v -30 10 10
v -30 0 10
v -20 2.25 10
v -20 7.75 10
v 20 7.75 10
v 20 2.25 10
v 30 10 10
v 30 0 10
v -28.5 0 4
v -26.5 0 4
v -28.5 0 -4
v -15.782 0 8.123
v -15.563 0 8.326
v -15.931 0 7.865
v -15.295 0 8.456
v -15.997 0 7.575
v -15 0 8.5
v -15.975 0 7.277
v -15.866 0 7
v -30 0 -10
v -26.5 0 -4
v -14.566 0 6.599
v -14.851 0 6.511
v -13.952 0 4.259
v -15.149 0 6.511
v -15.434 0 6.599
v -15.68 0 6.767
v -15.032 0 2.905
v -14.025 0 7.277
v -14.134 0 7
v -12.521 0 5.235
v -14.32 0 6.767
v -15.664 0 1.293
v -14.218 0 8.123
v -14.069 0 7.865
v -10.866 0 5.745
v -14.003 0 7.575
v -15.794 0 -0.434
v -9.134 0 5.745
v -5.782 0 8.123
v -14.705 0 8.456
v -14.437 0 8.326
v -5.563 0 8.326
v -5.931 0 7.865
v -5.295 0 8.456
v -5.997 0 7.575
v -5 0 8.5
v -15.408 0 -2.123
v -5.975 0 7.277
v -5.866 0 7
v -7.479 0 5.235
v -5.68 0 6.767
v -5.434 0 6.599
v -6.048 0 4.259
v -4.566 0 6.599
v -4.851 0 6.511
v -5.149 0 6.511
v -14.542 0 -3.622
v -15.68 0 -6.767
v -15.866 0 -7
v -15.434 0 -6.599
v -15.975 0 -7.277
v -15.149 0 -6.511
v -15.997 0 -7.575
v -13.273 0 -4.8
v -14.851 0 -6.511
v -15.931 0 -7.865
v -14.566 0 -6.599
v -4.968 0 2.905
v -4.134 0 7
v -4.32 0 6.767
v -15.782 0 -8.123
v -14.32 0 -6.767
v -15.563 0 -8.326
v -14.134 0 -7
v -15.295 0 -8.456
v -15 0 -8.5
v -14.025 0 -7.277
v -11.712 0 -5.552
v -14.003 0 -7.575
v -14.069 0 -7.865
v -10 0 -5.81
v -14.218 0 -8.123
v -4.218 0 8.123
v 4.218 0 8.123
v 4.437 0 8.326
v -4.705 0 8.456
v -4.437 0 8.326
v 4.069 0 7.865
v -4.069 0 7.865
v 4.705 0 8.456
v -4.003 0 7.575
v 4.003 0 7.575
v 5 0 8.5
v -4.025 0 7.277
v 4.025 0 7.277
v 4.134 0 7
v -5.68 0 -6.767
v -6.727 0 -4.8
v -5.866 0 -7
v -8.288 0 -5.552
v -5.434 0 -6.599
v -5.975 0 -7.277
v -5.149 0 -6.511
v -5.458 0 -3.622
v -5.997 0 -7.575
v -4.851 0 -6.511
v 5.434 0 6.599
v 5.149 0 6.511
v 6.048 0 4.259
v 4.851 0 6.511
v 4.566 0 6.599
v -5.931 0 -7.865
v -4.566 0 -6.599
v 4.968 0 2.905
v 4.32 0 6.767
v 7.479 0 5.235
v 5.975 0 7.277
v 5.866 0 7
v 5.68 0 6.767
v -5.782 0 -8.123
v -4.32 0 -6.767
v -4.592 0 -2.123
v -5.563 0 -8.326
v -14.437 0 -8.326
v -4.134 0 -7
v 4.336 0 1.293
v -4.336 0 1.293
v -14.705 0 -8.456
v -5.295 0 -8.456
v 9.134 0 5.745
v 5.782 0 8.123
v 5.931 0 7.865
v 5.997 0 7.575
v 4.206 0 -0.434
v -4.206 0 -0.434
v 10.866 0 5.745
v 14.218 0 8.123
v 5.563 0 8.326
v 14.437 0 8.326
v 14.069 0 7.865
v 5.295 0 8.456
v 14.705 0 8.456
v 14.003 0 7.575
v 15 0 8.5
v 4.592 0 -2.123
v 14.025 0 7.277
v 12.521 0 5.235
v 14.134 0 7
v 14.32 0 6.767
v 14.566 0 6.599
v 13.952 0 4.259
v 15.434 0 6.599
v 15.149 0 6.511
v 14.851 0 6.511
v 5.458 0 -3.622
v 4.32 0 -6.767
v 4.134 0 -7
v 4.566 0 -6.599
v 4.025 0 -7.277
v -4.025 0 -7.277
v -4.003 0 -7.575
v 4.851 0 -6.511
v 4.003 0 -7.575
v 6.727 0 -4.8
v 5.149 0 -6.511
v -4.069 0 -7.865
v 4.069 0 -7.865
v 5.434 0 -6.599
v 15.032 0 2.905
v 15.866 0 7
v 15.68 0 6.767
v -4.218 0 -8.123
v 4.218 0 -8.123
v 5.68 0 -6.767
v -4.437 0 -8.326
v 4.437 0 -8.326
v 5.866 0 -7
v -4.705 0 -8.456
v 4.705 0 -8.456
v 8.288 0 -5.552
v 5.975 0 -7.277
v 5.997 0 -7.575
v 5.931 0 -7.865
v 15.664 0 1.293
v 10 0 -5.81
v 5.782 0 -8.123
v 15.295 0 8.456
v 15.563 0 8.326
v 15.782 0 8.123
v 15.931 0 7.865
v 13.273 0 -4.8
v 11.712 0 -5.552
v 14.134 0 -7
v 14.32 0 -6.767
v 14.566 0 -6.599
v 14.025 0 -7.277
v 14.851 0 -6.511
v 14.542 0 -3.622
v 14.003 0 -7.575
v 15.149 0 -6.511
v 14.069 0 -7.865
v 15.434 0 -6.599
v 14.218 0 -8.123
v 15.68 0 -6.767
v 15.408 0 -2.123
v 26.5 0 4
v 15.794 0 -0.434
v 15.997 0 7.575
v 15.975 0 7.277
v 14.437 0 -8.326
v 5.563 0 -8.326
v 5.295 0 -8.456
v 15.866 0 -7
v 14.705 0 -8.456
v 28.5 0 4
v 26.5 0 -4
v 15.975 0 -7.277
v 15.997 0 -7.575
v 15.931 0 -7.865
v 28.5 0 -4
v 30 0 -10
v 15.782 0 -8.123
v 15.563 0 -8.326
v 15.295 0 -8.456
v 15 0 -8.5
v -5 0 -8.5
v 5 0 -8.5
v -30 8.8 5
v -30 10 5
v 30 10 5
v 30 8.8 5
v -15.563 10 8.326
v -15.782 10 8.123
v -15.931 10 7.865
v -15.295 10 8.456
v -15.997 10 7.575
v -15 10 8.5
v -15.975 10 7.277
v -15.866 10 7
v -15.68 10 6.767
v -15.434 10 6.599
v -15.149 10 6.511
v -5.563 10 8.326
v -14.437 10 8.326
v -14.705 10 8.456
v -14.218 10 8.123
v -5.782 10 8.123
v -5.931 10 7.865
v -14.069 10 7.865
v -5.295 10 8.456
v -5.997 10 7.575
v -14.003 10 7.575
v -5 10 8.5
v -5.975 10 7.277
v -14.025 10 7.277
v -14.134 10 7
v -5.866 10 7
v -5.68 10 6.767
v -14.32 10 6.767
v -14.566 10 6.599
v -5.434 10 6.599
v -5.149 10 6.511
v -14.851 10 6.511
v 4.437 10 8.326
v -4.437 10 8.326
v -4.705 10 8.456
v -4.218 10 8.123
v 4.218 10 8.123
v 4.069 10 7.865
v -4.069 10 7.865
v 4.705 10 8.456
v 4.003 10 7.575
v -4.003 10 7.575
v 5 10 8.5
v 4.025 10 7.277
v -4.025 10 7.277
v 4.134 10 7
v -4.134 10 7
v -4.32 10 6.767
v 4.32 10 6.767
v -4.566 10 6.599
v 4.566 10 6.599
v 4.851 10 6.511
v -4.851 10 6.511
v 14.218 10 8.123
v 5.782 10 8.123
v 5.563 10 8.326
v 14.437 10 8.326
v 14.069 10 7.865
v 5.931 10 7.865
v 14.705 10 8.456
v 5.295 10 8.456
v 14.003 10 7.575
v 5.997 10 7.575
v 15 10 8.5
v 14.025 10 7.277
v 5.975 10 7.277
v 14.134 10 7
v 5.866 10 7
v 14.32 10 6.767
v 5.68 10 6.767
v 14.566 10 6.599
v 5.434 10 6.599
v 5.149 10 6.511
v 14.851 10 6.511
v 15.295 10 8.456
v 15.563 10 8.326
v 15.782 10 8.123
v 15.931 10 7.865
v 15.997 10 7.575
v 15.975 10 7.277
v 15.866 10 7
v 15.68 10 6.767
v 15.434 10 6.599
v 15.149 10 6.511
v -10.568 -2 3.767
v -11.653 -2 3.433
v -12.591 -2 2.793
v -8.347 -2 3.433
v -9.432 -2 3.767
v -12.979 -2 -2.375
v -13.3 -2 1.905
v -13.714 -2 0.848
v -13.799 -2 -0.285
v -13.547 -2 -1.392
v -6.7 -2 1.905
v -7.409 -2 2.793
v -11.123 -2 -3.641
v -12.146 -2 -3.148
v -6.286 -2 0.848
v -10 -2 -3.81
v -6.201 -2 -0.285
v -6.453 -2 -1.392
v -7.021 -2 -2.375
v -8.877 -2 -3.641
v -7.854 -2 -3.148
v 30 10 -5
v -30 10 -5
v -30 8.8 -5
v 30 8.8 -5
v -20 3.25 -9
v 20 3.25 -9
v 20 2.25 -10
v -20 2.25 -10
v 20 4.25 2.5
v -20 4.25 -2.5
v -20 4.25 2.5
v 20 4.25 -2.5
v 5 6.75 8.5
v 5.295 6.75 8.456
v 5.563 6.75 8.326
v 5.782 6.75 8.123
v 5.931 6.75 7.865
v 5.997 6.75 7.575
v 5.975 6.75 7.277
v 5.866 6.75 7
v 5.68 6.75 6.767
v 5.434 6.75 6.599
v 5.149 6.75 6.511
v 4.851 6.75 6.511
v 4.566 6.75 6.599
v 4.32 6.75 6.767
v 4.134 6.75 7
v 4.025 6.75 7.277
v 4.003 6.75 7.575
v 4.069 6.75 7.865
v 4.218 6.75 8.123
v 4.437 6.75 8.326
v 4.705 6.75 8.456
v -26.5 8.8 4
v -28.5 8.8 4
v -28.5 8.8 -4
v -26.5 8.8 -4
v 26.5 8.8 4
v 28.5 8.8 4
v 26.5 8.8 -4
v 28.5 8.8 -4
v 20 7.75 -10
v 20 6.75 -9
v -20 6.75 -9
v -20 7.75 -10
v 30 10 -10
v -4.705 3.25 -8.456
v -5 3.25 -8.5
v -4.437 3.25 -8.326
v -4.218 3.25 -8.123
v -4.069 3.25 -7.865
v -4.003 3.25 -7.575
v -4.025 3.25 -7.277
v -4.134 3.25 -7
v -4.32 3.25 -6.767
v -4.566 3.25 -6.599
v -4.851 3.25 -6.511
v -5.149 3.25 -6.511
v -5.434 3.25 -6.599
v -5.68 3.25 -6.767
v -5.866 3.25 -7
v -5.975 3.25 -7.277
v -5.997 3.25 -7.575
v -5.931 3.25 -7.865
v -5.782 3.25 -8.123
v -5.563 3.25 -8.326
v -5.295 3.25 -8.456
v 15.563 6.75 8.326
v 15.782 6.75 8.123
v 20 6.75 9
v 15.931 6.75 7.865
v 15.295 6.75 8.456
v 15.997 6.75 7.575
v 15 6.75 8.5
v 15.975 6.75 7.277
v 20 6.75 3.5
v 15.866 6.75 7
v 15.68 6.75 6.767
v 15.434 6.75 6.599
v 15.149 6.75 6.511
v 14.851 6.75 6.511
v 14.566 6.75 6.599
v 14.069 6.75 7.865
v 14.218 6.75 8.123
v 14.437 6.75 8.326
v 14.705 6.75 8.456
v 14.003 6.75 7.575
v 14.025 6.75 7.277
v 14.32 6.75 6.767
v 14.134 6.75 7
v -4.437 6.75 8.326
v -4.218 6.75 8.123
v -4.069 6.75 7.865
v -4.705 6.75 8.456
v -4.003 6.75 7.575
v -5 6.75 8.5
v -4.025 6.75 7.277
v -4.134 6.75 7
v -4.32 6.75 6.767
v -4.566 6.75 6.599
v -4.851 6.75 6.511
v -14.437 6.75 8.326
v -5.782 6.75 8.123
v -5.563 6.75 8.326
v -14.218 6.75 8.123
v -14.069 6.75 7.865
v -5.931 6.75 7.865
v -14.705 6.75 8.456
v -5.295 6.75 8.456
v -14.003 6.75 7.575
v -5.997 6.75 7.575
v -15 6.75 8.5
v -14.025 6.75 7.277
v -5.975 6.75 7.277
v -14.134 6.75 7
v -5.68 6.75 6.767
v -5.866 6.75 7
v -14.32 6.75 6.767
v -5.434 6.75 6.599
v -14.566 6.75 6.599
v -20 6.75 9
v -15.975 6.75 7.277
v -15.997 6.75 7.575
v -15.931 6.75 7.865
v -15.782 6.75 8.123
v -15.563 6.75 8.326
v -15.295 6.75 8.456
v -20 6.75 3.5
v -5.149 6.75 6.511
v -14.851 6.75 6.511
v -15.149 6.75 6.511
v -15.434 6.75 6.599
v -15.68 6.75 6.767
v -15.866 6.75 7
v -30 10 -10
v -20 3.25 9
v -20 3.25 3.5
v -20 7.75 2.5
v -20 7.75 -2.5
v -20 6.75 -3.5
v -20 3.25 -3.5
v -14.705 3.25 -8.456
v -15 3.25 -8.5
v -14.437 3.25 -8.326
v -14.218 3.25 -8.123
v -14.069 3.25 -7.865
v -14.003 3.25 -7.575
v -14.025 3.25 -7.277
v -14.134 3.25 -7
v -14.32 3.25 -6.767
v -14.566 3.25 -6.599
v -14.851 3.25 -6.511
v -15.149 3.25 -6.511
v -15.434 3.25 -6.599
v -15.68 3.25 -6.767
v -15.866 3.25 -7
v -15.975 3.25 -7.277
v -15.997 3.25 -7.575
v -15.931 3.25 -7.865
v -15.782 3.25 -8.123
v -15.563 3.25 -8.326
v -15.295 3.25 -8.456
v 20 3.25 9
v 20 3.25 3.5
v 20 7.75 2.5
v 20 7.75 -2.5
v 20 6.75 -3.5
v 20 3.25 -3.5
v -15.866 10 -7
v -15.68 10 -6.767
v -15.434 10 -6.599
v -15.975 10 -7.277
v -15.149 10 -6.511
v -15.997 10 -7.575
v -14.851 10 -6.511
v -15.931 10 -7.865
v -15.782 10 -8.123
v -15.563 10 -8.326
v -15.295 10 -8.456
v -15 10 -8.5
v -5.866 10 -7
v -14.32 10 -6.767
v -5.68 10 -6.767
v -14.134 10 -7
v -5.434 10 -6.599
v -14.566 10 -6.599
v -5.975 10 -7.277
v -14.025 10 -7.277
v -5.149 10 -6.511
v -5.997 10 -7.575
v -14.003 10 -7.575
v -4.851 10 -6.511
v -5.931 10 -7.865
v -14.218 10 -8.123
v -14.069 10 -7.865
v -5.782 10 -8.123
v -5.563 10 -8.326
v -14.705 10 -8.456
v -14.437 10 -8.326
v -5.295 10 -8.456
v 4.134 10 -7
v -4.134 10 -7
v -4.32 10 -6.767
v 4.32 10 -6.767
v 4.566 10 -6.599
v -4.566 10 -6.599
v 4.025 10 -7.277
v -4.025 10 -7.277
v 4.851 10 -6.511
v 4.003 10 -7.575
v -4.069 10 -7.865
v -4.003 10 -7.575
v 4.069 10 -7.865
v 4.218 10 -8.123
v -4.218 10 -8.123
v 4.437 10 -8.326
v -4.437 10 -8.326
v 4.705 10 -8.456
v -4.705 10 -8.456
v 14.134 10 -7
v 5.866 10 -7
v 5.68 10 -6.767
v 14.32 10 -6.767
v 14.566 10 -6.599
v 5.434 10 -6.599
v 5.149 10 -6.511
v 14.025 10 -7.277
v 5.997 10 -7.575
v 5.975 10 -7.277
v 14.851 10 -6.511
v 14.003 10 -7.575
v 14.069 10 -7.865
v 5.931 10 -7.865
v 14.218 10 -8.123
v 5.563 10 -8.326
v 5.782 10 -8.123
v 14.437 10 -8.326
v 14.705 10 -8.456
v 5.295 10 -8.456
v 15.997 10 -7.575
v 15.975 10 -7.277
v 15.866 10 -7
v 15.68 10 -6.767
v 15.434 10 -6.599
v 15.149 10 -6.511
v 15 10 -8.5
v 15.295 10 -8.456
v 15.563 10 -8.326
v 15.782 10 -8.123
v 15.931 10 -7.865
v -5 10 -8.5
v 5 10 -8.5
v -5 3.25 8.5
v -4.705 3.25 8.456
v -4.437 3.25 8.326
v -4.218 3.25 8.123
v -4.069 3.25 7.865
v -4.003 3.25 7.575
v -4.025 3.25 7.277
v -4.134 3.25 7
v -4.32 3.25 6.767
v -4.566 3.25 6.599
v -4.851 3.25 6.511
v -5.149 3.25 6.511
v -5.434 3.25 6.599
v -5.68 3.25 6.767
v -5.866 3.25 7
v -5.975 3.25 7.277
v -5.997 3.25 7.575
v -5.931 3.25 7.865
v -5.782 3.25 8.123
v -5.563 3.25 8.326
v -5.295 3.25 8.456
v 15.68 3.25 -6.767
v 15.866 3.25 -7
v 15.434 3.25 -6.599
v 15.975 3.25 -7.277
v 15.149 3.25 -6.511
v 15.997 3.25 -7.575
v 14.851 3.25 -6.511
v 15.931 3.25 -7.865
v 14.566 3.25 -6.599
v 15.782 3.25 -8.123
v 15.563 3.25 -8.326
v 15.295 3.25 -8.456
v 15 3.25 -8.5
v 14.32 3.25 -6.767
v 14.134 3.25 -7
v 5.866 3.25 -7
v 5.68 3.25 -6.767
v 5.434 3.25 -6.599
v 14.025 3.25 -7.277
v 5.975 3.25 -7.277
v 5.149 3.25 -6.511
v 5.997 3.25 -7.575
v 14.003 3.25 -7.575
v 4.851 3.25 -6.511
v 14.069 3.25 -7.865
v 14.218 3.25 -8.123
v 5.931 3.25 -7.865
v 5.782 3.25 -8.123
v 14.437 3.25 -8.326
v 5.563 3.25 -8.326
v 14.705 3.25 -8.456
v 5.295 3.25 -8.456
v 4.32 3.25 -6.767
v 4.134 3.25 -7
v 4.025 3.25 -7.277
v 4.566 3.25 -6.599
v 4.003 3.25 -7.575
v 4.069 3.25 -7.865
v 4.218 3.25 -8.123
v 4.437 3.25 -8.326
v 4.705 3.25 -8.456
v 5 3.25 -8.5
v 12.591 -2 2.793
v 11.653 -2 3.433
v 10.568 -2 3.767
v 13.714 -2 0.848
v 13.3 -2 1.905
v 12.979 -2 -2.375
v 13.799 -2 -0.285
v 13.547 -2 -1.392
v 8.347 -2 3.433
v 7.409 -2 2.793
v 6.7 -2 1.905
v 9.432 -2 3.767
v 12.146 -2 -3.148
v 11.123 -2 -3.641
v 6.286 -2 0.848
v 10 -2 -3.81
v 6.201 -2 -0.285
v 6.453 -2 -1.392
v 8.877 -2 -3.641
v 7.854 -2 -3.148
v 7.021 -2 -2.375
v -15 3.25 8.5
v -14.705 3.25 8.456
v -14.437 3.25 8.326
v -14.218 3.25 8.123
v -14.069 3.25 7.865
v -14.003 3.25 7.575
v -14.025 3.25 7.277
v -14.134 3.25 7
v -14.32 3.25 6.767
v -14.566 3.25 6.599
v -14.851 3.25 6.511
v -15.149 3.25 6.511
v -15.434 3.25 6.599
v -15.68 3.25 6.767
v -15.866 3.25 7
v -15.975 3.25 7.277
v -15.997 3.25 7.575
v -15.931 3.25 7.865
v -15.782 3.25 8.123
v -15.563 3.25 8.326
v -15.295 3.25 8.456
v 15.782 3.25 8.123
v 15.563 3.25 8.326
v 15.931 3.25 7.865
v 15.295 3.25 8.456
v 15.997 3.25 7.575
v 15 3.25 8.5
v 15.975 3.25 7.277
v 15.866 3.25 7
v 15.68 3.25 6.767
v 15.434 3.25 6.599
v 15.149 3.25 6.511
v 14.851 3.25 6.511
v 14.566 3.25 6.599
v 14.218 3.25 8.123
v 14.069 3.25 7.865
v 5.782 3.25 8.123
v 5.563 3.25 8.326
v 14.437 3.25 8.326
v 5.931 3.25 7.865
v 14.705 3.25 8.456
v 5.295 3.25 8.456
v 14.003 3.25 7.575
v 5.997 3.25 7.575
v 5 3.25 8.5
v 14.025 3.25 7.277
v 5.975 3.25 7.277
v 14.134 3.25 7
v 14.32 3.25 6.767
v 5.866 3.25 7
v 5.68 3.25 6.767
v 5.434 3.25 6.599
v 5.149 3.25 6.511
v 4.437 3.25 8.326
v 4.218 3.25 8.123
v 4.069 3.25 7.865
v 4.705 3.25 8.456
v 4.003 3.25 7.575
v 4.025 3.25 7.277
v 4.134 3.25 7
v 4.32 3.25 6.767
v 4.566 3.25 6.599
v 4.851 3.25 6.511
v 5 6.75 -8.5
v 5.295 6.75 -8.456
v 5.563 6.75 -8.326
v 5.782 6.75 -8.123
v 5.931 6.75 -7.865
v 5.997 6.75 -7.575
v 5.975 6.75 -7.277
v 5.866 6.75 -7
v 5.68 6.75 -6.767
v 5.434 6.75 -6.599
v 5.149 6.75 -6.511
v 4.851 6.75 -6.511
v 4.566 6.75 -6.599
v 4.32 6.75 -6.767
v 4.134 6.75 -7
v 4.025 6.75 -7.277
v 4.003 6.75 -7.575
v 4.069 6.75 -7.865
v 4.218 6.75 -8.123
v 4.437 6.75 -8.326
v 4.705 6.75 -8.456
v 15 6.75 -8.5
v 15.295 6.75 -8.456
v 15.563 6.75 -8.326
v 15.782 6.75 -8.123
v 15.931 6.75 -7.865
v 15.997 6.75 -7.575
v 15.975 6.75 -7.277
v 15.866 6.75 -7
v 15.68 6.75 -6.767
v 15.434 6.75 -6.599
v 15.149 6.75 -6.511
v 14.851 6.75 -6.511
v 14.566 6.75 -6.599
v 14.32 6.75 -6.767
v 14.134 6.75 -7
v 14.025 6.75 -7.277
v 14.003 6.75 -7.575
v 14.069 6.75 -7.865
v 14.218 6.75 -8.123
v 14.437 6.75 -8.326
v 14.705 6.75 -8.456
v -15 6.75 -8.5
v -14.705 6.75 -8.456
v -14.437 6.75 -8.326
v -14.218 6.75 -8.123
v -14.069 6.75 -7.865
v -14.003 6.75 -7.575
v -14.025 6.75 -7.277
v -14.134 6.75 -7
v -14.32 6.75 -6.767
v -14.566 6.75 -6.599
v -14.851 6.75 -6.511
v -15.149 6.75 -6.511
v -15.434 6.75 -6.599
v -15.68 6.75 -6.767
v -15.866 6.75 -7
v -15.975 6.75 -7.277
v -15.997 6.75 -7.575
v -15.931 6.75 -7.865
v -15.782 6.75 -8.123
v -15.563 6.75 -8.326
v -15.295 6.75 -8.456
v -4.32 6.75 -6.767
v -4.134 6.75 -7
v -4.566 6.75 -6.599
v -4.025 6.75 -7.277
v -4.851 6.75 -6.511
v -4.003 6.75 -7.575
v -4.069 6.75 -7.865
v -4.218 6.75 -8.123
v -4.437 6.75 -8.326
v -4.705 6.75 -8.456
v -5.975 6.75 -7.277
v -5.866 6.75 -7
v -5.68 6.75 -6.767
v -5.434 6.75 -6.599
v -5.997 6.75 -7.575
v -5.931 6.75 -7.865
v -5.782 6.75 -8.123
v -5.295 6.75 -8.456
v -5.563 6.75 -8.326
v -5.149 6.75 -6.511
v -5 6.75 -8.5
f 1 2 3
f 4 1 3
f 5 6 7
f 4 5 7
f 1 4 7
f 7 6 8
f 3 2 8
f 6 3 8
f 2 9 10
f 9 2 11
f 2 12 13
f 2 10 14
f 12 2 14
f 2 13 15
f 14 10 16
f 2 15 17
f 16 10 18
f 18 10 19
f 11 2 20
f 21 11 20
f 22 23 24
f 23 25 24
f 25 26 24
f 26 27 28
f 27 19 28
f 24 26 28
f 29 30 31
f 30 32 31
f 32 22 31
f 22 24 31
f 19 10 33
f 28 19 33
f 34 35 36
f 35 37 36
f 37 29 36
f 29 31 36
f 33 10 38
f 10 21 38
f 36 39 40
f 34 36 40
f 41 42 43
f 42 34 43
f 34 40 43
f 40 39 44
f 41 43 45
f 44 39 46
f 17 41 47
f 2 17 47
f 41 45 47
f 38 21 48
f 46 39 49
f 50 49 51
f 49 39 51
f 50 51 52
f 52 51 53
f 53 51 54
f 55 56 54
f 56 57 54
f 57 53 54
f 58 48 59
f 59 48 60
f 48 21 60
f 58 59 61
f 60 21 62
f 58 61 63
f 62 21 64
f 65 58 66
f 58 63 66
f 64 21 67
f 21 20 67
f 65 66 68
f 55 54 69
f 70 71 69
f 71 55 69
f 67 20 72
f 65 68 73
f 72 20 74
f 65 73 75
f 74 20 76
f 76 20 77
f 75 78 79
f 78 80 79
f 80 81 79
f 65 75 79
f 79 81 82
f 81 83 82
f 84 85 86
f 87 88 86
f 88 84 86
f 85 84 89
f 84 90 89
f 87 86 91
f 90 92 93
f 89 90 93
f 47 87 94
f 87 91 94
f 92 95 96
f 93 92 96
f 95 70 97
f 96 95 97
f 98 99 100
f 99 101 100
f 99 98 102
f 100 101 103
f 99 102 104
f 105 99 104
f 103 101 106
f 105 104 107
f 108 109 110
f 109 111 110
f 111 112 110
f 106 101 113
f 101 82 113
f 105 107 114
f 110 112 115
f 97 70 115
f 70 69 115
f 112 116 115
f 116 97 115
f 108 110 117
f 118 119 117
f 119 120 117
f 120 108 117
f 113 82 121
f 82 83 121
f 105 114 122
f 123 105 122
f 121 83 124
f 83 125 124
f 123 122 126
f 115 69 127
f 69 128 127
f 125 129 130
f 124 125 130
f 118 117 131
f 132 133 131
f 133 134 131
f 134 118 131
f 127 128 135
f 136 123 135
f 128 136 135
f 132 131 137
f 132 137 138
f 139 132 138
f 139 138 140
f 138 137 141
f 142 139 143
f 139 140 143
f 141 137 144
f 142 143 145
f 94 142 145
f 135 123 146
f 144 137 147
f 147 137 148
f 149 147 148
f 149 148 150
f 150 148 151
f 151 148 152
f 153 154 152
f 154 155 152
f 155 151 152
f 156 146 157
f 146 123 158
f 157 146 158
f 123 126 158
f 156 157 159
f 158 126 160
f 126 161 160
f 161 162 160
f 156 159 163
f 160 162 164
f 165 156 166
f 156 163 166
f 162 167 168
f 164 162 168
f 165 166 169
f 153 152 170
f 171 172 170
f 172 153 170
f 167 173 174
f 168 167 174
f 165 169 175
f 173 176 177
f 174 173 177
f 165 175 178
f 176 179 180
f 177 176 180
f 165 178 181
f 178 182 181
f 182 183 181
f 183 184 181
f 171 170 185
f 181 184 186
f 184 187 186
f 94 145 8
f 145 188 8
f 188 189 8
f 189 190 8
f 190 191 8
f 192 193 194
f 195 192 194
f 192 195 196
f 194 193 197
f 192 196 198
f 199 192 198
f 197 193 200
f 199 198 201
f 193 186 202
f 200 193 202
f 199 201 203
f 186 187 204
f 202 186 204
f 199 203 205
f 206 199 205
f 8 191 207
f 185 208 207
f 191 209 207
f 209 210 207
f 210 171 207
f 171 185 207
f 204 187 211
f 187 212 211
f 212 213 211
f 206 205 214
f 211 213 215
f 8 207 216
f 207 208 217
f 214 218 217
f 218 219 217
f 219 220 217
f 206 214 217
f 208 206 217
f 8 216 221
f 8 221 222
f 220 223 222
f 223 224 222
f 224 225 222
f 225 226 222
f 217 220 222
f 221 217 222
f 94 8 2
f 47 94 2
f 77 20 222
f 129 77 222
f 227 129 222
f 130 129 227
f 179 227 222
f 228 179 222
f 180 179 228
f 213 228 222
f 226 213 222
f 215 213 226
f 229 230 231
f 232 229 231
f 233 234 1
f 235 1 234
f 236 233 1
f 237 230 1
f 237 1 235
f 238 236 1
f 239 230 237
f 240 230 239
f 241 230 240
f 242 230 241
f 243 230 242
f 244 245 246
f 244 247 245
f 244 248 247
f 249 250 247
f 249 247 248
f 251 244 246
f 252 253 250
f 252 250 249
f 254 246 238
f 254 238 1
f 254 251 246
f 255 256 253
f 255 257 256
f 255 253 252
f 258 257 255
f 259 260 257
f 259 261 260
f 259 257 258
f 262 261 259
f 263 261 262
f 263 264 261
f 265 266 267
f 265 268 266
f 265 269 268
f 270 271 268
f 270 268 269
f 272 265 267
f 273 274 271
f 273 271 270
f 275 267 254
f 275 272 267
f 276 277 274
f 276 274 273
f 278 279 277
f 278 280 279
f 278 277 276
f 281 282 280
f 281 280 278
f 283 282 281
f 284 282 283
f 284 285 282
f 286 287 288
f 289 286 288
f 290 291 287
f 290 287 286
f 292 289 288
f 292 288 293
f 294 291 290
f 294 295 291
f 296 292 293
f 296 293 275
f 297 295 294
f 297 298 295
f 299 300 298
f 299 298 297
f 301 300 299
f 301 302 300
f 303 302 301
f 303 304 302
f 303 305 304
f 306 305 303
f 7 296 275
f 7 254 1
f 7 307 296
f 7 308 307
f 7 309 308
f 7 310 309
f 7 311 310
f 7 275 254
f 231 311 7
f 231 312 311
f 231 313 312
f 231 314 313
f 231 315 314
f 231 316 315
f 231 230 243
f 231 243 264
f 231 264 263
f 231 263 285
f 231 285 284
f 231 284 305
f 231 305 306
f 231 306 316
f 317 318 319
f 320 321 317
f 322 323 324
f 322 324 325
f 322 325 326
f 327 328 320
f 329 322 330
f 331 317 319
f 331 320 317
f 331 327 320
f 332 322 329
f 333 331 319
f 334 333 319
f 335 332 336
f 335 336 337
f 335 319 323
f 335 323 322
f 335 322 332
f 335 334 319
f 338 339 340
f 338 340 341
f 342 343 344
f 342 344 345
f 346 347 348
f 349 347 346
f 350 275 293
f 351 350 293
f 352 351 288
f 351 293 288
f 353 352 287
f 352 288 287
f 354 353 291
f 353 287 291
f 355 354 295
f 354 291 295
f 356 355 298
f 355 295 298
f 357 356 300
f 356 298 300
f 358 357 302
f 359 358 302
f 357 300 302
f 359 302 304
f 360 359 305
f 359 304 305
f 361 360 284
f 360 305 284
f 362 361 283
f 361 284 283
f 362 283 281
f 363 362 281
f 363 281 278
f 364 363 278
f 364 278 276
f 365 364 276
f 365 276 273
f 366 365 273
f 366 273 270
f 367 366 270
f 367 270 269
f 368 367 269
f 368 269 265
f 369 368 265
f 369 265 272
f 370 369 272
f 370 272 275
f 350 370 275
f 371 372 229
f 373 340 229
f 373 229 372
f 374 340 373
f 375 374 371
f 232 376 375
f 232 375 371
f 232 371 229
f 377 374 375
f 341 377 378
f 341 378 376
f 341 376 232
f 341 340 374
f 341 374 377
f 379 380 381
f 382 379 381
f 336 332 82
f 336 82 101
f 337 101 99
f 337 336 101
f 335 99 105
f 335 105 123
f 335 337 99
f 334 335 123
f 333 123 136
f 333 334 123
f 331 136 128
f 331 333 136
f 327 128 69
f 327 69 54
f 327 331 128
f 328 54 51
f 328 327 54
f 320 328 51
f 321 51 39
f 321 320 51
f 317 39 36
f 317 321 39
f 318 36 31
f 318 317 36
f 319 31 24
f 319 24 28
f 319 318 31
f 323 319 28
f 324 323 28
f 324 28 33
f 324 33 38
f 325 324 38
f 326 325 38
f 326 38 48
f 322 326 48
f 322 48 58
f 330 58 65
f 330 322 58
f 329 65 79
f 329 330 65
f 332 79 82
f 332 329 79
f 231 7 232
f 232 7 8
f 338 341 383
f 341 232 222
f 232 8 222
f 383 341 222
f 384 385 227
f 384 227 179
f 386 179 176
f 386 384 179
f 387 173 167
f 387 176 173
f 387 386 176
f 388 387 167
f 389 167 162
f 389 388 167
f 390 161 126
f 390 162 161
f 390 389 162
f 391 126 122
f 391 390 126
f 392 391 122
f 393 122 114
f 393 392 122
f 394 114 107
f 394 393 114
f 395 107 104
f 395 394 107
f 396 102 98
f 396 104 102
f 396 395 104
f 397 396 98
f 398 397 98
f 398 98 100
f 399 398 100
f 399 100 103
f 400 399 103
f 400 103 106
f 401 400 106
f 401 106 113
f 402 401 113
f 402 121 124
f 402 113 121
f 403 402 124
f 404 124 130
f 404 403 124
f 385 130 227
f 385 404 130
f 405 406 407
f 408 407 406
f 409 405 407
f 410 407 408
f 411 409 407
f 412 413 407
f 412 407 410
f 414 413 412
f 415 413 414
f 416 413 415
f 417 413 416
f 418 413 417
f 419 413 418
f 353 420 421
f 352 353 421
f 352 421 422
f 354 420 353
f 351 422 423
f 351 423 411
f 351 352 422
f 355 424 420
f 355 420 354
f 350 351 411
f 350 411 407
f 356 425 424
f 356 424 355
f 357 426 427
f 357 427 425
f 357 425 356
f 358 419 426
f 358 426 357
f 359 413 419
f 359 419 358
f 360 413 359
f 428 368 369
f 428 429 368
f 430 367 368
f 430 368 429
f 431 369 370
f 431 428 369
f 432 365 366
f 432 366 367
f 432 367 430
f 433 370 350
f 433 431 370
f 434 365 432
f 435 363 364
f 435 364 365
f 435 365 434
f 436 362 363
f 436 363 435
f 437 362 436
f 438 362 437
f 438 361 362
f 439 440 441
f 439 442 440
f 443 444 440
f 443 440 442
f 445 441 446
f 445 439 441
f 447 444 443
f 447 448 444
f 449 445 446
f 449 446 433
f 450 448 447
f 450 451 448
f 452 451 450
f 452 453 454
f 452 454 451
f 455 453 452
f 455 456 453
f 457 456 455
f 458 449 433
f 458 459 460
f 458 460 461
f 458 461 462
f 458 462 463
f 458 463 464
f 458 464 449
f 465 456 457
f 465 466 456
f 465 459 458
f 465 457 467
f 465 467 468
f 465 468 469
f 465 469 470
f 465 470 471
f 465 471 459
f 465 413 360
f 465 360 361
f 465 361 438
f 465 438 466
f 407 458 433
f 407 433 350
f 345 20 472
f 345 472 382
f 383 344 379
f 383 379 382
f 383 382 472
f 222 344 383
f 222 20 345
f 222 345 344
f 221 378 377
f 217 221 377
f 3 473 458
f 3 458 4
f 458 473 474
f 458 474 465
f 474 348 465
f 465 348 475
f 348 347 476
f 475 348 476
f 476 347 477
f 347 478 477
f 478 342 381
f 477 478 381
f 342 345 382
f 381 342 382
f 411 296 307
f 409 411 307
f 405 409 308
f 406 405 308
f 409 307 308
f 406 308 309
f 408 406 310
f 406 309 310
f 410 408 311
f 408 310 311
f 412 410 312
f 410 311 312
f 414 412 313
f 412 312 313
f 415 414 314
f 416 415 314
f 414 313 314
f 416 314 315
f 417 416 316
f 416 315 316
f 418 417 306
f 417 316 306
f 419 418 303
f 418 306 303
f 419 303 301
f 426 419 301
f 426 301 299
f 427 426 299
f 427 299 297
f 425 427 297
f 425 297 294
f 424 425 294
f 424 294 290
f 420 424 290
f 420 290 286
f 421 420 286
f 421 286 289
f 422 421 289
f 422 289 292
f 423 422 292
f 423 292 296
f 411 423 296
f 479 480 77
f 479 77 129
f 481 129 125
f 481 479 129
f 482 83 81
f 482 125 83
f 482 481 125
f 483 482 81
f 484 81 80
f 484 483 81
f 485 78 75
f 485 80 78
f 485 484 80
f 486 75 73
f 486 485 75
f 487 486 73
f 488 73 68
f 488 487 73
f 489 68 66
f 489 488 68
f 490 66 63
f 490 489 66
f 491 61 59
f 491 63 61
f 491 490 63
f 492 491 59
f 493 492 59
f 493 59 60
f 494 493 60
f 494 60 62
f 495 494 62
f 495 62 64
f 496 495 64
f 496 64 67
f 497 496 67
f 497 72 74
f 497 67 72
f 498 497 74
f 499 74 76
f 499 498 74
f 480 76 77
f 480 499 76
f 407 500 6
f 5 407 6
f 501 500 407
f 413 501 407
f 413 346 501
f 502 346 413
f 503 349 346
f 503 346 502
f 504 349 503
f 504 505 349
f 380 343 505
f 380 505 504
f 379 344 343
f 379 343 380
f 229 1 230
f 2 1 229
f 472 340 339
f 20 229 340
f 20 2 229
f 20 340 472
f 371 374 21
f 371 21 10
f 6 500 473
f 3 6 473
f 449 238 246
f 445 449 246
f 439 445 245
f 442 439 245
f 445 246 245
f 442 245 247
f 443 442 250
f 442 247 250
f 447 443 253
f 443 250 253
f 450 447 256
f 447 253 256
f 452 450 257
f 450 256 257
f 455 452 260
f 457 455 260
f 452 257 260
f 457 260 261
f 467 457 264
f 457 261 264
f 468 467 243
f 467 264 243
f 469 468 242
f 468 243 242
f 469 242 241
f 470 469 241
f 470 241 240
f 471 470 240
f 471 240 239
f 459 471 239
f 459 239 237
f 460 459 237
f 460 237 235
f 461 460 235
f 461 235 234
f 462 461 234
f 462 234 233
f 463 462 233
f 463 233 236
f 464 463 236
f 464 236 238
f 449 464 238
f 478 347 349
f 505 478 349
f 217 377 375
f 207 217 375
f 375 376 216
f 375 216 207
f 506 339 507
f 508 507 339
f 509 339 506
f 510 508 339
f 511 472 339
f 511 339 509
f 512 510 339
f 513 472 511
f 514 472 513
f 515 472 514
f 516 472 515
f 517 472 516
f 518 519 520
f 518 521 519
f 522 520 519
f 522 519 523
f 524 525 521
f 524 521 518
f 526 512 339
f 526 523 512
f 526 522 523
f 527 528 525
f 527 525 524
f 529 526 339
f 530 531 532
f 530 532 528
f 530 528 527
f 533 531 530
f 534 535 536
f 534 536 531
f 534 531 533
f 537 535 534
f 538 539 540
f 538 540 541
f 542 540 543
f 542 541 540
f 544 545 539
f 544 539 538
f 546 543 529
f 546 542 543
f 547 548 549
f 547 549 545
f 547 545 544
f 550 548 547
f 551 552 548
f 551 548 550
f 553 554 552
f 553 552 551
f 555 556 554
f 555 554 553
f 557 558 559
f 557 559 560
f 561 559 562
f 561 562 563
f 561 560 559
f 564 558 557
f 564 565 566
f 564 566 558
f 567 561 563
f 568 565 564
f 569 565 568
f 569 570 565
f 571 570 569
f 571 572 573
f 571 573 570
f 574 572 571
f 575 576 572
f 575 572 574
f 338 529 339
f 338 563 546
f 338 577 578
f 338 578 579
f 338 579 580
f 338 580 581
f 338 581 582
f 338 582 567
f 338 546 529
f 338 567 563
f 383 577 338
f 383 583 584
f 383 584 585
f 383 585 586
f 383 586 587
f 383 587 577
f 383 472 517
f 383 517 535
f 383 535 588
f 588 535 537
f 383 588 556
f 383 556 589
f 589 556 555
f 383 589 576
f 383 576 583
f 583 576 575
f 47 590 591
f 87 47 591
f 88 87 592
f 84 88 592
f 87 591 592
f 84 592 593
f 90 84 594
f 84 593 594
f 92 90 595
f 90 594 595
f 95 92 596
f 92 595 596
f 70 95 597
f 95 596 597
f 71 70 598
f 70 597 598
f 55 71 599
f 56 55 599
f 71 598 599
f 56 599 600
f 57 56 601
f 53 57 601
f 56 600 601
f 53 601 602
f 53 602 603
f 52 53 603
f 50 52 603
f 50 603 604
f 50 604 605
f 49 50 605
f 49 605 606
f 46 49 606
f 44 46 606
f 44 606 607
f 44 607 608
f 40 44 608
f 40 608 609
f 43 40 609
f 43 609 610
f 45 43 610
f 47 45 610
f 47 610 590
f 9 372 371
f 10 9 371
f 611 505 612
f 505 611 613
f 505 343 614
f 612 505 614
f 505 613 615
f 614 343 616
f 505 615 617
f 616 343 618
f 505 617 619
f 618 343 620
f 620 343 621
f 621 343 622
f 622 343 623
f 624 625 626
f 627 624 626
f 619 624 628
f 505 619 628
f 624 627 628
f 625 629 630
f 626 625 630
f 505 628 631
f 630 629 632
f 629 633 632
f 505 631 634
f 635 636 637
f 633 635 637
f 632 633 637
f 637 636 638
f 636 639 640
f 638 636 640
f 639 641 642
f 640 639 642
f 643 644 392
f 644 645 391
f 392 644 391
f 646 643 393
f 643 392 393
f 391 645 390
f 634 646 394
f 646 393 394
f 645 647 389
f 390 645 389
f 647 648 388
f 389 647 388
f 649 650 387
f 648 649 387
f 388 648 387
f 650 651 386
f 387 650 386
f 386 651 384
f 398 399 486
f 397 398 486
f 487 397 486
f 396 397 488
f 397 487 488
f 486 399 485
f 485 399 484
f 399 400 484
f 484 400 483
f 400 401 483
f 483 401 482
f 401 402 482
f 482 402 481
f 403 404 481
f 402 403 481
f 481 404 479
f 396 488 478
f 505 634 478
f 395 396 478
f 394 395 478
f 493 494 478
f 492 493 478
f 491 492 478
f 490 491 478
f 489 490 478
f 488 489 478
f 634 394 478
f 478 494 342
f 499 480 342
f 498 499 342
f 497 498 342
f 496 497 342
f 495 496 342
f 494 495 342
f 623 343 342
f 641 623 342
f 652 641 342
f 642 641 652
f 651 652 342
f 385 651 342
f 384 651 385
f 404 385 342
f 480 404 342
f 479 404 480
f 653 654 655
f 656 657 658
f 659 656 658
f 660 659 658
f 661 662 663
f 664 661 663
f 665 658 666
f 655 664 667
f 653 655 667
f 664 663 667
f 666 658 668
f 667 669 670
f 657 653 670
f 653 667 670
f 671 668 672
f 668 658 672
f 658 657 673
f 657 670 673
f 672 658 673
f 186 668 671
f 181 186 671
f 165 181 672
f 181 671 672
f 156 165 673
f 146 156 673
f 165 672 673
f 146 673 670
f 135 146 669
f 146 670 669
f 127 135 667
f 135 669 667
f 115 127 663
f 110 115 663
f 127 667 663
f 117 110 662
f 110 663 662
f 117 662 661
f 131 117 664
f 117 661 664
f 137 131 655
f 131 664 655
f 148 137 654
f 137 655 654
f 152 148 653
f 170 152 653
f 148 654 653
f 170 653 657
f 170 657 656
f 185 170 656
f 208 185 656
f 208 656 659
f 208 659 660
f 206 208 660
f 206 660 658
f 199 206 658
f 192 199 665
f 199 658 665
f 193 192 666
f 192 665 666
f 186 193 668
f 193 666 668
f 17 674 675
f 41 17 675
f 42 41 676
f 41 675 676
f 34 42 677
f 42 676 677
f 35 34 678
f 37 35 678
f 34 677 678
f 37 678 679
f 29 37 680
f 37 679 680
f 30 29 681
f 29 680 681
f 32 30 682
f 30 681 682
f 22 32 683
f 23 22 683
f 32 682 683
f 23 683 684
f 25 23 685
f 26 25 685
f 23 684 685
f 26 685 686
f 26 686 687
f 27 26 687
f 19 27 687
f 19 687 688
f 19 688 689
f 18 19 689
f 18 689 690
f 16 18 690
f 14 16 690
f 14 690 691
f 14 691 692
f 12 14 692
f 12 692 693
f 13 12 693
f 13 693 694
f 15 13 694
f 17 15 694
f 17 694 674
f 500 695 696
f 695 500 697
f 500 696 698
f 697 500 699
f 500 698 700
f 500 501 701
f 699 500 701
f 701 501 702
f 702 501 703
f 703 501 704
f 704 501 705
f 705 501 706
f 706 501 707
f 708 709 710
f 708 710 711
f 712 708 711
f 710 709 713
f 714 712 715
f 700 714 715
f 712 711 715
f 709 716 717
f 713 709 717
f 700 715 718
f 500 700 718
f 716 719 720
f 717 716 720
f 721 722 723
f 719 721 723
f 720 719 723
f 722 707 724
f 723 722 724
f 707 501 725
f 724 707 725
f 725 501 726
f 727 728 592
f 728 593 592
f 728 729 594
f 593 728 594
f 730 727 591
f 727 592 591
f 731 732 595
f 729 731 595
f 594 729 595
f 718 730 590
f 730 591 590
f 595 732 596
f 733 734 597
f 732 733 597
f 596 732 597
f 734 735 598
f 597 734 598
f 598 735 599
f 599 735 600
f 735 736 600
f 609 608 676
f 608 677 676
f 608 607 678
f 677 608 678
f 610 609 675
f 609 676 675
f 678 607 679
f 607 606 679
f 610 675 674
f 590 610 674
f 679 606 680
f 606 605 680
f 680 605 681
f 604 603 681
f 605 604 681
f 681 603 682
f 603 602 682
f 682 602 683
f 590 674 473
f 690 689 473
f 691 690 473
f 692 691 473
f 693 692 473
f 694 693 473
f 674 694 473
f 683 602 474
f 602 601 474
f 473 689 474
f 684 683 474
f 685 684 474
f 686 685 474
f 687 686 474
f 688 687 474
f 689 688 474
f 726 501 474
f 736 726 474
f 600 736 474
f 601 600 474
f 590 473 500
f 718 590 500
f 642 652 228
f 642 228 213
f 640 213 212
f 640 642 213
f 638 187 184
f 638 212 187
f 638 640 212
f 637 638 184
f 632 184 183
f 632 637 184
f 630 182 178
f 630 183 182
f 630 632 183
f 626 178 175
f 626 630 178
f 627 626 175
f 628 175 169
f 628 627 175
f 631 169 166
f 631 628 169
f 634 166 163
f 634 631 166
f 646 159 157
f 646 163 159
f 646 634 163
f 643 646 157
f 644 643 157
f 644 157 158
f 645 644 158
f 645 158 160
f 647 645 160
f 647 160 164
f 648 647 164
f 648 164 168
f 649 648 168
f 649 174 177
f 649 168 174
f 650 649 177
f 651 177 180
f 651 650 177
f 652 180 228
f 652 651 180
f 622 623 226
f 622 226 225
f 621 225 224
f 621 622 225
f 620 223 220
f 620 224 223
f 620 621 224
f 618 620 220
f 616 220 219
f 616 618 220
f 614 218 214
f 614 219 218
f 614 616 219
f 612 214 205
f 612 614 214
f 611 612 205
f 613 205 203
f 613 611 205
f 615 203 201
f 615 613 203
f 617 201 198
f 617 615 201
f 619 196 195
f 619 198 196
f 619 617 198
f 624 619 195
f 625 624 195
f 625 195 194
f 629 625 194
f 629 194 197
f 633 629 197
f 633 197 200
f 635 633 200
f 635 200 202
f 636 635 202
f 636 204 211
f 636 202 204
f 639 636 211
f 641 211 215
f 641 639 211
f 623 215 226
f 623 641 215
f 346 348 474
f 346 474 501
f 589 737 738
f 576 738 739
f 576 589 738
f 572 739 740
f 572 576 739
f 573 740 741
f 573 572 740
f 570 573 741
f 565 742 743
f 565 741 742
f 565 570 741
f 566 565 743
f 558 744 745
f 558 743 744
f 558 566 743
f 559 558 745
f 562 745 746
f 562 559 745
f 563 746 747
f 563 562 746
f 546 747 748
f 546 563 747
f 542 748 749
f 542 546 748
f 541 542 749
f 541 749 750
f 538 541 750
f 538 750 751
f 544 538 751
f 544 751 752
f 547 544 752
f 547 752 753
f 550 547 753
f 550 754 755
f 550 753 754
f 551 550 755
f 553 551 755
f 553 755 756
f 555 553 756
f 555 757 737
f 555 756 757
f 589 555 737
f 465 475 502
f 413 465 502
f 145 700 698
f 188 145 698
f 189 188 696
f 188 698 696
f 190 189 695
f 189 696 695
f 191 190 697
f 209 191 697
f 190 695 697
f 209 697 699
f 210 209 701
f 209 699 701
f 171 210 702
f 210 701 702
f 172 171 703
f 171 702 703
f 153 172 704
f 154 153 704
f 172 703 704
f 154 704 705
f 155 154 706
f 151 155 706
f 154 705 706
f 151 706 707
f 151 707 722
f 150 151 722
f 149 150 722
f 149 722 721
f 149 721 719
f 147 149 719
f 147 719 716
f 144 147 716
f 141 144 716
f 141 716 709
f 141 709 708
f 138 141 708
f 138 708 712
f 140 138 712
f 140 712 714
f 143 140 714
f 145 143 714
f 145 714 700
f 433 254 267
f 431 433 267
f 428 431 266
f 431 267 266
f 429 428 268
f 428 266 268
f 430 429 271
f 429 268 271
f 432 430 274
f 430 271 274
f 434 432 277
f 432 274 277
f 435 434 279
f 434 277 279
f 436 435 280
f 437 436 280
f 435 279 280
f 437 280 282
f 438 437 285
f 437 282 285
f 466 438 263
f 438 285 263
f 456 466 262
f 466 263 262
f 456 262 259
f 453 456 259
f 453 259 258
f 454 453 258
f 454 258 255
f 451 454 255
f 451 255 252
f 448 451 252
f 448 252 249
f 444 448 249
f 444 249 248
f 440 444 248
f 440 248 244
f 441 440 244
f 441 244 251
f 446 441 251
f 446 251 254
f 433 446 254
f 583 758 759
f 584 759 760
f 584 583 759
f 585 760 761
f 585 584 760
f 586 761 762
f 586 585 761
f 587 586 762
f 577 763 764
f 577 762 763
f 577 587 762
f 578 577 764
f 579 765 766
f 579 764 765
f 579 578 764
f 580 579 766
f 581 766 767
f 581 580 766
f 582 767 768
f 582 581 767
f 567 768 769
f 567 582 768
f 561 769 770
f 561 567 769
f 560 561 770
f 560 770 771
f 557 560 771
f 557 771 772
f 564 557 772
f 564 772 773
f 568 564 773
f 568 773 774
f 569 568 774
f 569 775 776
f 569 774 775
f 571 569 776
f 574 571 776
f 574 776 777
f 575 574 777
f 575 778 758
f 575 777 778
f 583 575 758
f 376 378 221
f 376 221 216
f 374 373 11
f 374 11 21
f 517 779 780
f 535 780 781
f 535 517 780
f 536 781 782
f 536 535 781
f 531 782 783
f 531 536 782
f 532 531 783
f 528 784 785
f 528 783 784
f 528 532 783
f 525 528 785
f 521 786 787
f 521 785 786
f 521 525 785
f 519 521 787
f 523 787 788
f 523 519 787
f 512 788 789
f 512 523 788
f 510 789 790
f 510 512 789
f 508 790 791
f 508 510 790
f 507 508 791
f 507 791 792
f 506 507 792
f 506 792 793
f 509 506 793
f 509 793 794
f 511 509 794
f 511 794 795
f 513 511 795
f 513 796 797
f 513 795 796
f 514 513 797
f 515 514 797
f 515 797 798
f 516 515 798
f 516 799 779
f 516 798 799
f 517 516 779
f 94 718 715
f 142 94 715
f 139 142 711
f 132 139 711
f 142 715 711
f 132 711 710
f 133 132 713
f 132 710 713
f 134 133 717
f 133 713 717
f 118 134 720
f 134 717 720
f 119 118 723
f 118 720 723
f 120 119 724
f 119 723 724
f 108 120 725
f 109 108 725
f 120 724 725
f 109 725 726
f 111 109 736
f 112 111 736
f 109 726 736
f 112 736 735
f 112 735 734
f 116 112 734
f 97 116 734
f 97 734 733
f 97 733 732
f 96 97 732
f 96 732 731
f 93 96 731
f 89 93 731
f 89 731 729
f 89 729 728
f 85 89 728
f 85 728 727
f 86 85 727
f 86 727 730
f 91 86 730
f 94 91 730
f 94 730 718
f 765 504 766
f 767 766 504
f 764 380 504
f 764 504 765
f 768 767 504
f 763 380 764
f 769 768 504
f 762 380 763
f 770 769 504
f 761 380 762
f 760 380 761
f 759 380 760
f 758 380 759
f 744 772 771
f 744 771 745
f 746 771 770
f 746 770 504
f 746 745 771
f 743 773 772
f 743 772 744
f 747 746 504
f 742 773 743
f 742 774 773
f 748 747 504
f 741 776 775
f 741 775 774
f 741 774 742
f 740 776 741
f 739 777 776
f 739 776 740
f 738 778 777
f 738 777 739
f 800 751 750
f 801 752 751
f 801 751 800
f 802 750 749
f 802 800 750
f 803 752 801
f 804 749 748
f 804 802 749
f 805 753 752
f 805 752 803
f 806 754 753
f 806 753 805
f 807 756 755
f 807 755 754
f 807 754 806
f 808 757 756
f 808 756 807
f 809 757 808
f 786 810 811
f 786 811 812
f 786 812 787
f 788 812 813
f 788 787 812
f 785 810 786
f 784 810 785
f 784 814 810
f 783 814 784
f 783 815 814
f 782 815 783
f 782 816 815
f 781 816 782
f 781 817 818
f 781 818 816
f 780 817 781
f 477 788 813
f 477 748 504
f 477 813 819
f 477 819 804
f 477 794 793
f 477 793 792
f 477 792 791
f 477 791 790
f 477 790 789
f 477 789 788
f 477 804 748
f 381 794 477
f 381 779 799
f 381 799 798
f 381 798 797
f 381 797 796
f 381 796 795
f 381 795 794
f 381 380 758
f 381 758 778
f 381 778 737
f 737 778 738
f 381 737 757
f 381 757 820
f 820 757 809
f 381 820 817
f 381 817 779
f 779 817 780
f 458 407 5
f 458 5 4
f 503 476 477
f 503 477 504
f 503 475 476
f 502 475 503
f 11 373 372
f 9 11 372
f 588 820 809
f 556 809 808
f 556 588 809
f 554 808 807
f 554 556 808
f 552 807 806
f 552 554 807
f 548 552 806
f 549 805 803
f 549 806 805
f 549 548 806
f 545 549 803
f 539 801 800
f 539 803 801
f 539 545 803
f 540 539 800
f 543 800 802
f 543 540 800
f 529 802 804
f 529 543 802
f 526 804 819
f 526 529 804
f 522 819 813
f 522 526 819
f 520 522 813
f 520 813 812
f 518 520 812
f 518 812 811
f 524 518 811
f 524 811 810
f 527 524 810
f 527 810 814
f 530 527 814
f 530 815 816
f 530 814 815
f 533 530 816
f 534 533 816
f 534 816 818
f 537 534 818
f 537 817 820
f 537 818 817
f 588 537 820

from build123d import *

# Parameters (mm, degrees)
SKETCH1_W                = 60
SKETCH1_H                = 20
BASE_DEPTH               = 10
SKETCH2_R                = 3.81
FSR_MOUNT_DEPTH          = 2
CHAMFER1_SIZE            = 2
CHAMFER1_OF_MIRROR1_SIZE = 2
SKETCH5_W                = 40
SKETCH5_H                = 3.5
CUT_EXTRUDE3_DEPTH       = 20
SKETCH6_W                = 40
SKETCH6_H                = 5
BOSS_EXTRUDE4_DEPTH      = 1
SKETCH8_W                = 40
SKETCH8_H                = 5
CUT_EXTRUDE6_DEPTH       = 1
CHAMFER2_SIZE            = 1
SKETCH9_W                = 2
SKETCH9_H                = 8
CUT_EXTRUDE7_DEPTH       = 10
SKETCH10_W               = 60
SKETCH10_H               = 10
CUT_EXTRUDE8_DEPTH       = 1.2
SKETCH11_R               = 1
CUT_EXTRUDE9_DEPTH       = 34.823069051


with BuildPart() as part:
    # Sketch1 → Base (new body)
    with BuildSketch(Plane(origin=(0, 0, 0), x_dir=(1, 0, 0), z_dir=(0, 1, 0))):
        Rectangle(SKETCH1_W, SKETCH1_H)
    extrude(amount=BASE_DEPTH)

    # Sketch2 → FSR Mount (add)
    with BuildSketch(Plane.XZ):
        with Locations(Location((-10, 0, 0), (0, 0, 270))):
            Circle(SKETCH2_R)
    fsr_mount = extrude(amount=FSR_MOUNT_DEPTH)

    # Chamfer1
    chamfer1_edges = [part.edges().sort_by_distance(p)[0] for p in [
        (-10, 0, 3.81),
    ]]
    chamfer(chamfer1_edges, length=CHAMFER1_SIZE - 0.0001)  # a hair under: the kernel refuses the full size

    # Mirror1: FSR Mount across plane
    add(fsr_mount.mirror(Plane(origin=(0, 0, 0), x_dir=(0, 0, 1), z_dir=(1, 0, 0))))

    # Chamfer1 of Mirror1
    chamfer1_of_mirror1_edges = [part.edges().sort_by_distance(p)[0] for p in [
        (10, 0, 3.81),
    ]]
    chamfer(chamfer1_of_mirror1_edges, length=CHAMFER1_OF_MIRROR1_SIZE - 0.0001)  # a hair under: the kernel refuses the full size

    # Sketch5 → Cut-Extrude3 (cut)
    with BuildSketch(Plane(origin=(0, 0, -10), x_dir=(-1, 0, 0), z_dir=(0, 0, -1))):
        with Locations((0, 5)):
            Rectangle(SKETCH5_W, SKETCH5_H)
    extrude(amount=-CUT_EXTRUDE3_DEPTH, mode=Mode.SUBTRACT)

    # Sketch6 → Boss-Extrude4 (add)
    with BuildSketch(Plane(origin=(0, 3.25, 0), x_dir=(1, 0, 0), z_dir=(0, 1, 0))):
        Rectangle(SKETCH6_W, SKETCH6_H)
    extrude(amount=BOSS_EXTRUDE4_DEPTH)

    # Sketch8 → Cut-Extrude6 (cut)
    with BuildSketch(Plane.XZ.offset(-6.75)):
        Rectangle(SKETCH8_W, SKETCH8_H)
    extrude(amount=-CUT_EXTRUDE6_DEPTH, mode=Mode.SUBTRACT)

    # Chamfer2
    chamfer2_edges = [part.edges().sort_by_distance(p)[0] for p in [
        (0, 6.75, -2.5),
        (0, 6.75, 10),
        (0, 3.25, -2.5),
        (0, 3.25, 2.5),
        (0, 3.25, -10),
        (0, 6.75, -10),
        (0, 3.25, 10),
        (0, 6.75, 2.5),
    ]]
    chamfer(chamfer2_edges, length=CHAMFER2_SIZE - 0.0001)  # a hair under: the kernel refuses the full size

    # Sketch9 → Cut-Extrude7 (cut)
    with BuildSketch(Plane.XZ):
        with Locations((-27.5, 0)):
            Rectangle(SKETCH9_W, SKETCH9_H)
    cut_extrude7 = extrude(amount=-CUT_EXTRUDE7_DEPTH, mode=Mode.SUBTRACT)

    # Mirror2: Cut-Extrude7 across plane
    add(cut_extrude7.mirror(Plane(origin=(0, 0, 0), x_dir=(0, 0, 1), z_dir=(1, 0, 0))), mode=Mode.SUBTRACT)

    # Sketch10 → Cut-Extrude8 (cut)
    with BuildSketch(Plane(origin=(0, 10, 0), x_dir=(1, 0, 0), z_dir=(0, 1, 0))):
        Rectangle(SKETCH10_W, SKETCH10_H)
    extrude(amount=-CUT_EXTRUDE8_DEPTH, mode=Mode.SUBTRACT)

    # Sketch11 → Cut-Extrude9 (cut, through all)
    with BuildSketch(Plane(origin=(0, 10, 0), x_dir=(1, 0, 0), z_dir=(0, 1, 0))):
        with Locations(Location((-15, -7.5, 0), (0, 0, 270))):
            Circle(SKETCH11_R)
        with Locations(Location((-5, -7.5, 0), (0, 0, 270))):
            Circle(SKETCH11_R)
        with Locations(Location((5, -7.5, 0), (0, 0, 270))):
            Circle(SKETCH11_R)
        with Locations(Location((15, -7.5, 0), (0, 0, 270))):
            Circle(SKETCH11_R)
    cut_extrude9 = extrude(amount=-CUT_EXTRUDE9_DEPTH, mode=Mode.SUBTRACT)

    # Mirror5: Cut-Extrude9 across plane
    add(cut_extrude9.mirror(Plane.XY), mode=Mode.SUBTRACT)


solid = part.part
